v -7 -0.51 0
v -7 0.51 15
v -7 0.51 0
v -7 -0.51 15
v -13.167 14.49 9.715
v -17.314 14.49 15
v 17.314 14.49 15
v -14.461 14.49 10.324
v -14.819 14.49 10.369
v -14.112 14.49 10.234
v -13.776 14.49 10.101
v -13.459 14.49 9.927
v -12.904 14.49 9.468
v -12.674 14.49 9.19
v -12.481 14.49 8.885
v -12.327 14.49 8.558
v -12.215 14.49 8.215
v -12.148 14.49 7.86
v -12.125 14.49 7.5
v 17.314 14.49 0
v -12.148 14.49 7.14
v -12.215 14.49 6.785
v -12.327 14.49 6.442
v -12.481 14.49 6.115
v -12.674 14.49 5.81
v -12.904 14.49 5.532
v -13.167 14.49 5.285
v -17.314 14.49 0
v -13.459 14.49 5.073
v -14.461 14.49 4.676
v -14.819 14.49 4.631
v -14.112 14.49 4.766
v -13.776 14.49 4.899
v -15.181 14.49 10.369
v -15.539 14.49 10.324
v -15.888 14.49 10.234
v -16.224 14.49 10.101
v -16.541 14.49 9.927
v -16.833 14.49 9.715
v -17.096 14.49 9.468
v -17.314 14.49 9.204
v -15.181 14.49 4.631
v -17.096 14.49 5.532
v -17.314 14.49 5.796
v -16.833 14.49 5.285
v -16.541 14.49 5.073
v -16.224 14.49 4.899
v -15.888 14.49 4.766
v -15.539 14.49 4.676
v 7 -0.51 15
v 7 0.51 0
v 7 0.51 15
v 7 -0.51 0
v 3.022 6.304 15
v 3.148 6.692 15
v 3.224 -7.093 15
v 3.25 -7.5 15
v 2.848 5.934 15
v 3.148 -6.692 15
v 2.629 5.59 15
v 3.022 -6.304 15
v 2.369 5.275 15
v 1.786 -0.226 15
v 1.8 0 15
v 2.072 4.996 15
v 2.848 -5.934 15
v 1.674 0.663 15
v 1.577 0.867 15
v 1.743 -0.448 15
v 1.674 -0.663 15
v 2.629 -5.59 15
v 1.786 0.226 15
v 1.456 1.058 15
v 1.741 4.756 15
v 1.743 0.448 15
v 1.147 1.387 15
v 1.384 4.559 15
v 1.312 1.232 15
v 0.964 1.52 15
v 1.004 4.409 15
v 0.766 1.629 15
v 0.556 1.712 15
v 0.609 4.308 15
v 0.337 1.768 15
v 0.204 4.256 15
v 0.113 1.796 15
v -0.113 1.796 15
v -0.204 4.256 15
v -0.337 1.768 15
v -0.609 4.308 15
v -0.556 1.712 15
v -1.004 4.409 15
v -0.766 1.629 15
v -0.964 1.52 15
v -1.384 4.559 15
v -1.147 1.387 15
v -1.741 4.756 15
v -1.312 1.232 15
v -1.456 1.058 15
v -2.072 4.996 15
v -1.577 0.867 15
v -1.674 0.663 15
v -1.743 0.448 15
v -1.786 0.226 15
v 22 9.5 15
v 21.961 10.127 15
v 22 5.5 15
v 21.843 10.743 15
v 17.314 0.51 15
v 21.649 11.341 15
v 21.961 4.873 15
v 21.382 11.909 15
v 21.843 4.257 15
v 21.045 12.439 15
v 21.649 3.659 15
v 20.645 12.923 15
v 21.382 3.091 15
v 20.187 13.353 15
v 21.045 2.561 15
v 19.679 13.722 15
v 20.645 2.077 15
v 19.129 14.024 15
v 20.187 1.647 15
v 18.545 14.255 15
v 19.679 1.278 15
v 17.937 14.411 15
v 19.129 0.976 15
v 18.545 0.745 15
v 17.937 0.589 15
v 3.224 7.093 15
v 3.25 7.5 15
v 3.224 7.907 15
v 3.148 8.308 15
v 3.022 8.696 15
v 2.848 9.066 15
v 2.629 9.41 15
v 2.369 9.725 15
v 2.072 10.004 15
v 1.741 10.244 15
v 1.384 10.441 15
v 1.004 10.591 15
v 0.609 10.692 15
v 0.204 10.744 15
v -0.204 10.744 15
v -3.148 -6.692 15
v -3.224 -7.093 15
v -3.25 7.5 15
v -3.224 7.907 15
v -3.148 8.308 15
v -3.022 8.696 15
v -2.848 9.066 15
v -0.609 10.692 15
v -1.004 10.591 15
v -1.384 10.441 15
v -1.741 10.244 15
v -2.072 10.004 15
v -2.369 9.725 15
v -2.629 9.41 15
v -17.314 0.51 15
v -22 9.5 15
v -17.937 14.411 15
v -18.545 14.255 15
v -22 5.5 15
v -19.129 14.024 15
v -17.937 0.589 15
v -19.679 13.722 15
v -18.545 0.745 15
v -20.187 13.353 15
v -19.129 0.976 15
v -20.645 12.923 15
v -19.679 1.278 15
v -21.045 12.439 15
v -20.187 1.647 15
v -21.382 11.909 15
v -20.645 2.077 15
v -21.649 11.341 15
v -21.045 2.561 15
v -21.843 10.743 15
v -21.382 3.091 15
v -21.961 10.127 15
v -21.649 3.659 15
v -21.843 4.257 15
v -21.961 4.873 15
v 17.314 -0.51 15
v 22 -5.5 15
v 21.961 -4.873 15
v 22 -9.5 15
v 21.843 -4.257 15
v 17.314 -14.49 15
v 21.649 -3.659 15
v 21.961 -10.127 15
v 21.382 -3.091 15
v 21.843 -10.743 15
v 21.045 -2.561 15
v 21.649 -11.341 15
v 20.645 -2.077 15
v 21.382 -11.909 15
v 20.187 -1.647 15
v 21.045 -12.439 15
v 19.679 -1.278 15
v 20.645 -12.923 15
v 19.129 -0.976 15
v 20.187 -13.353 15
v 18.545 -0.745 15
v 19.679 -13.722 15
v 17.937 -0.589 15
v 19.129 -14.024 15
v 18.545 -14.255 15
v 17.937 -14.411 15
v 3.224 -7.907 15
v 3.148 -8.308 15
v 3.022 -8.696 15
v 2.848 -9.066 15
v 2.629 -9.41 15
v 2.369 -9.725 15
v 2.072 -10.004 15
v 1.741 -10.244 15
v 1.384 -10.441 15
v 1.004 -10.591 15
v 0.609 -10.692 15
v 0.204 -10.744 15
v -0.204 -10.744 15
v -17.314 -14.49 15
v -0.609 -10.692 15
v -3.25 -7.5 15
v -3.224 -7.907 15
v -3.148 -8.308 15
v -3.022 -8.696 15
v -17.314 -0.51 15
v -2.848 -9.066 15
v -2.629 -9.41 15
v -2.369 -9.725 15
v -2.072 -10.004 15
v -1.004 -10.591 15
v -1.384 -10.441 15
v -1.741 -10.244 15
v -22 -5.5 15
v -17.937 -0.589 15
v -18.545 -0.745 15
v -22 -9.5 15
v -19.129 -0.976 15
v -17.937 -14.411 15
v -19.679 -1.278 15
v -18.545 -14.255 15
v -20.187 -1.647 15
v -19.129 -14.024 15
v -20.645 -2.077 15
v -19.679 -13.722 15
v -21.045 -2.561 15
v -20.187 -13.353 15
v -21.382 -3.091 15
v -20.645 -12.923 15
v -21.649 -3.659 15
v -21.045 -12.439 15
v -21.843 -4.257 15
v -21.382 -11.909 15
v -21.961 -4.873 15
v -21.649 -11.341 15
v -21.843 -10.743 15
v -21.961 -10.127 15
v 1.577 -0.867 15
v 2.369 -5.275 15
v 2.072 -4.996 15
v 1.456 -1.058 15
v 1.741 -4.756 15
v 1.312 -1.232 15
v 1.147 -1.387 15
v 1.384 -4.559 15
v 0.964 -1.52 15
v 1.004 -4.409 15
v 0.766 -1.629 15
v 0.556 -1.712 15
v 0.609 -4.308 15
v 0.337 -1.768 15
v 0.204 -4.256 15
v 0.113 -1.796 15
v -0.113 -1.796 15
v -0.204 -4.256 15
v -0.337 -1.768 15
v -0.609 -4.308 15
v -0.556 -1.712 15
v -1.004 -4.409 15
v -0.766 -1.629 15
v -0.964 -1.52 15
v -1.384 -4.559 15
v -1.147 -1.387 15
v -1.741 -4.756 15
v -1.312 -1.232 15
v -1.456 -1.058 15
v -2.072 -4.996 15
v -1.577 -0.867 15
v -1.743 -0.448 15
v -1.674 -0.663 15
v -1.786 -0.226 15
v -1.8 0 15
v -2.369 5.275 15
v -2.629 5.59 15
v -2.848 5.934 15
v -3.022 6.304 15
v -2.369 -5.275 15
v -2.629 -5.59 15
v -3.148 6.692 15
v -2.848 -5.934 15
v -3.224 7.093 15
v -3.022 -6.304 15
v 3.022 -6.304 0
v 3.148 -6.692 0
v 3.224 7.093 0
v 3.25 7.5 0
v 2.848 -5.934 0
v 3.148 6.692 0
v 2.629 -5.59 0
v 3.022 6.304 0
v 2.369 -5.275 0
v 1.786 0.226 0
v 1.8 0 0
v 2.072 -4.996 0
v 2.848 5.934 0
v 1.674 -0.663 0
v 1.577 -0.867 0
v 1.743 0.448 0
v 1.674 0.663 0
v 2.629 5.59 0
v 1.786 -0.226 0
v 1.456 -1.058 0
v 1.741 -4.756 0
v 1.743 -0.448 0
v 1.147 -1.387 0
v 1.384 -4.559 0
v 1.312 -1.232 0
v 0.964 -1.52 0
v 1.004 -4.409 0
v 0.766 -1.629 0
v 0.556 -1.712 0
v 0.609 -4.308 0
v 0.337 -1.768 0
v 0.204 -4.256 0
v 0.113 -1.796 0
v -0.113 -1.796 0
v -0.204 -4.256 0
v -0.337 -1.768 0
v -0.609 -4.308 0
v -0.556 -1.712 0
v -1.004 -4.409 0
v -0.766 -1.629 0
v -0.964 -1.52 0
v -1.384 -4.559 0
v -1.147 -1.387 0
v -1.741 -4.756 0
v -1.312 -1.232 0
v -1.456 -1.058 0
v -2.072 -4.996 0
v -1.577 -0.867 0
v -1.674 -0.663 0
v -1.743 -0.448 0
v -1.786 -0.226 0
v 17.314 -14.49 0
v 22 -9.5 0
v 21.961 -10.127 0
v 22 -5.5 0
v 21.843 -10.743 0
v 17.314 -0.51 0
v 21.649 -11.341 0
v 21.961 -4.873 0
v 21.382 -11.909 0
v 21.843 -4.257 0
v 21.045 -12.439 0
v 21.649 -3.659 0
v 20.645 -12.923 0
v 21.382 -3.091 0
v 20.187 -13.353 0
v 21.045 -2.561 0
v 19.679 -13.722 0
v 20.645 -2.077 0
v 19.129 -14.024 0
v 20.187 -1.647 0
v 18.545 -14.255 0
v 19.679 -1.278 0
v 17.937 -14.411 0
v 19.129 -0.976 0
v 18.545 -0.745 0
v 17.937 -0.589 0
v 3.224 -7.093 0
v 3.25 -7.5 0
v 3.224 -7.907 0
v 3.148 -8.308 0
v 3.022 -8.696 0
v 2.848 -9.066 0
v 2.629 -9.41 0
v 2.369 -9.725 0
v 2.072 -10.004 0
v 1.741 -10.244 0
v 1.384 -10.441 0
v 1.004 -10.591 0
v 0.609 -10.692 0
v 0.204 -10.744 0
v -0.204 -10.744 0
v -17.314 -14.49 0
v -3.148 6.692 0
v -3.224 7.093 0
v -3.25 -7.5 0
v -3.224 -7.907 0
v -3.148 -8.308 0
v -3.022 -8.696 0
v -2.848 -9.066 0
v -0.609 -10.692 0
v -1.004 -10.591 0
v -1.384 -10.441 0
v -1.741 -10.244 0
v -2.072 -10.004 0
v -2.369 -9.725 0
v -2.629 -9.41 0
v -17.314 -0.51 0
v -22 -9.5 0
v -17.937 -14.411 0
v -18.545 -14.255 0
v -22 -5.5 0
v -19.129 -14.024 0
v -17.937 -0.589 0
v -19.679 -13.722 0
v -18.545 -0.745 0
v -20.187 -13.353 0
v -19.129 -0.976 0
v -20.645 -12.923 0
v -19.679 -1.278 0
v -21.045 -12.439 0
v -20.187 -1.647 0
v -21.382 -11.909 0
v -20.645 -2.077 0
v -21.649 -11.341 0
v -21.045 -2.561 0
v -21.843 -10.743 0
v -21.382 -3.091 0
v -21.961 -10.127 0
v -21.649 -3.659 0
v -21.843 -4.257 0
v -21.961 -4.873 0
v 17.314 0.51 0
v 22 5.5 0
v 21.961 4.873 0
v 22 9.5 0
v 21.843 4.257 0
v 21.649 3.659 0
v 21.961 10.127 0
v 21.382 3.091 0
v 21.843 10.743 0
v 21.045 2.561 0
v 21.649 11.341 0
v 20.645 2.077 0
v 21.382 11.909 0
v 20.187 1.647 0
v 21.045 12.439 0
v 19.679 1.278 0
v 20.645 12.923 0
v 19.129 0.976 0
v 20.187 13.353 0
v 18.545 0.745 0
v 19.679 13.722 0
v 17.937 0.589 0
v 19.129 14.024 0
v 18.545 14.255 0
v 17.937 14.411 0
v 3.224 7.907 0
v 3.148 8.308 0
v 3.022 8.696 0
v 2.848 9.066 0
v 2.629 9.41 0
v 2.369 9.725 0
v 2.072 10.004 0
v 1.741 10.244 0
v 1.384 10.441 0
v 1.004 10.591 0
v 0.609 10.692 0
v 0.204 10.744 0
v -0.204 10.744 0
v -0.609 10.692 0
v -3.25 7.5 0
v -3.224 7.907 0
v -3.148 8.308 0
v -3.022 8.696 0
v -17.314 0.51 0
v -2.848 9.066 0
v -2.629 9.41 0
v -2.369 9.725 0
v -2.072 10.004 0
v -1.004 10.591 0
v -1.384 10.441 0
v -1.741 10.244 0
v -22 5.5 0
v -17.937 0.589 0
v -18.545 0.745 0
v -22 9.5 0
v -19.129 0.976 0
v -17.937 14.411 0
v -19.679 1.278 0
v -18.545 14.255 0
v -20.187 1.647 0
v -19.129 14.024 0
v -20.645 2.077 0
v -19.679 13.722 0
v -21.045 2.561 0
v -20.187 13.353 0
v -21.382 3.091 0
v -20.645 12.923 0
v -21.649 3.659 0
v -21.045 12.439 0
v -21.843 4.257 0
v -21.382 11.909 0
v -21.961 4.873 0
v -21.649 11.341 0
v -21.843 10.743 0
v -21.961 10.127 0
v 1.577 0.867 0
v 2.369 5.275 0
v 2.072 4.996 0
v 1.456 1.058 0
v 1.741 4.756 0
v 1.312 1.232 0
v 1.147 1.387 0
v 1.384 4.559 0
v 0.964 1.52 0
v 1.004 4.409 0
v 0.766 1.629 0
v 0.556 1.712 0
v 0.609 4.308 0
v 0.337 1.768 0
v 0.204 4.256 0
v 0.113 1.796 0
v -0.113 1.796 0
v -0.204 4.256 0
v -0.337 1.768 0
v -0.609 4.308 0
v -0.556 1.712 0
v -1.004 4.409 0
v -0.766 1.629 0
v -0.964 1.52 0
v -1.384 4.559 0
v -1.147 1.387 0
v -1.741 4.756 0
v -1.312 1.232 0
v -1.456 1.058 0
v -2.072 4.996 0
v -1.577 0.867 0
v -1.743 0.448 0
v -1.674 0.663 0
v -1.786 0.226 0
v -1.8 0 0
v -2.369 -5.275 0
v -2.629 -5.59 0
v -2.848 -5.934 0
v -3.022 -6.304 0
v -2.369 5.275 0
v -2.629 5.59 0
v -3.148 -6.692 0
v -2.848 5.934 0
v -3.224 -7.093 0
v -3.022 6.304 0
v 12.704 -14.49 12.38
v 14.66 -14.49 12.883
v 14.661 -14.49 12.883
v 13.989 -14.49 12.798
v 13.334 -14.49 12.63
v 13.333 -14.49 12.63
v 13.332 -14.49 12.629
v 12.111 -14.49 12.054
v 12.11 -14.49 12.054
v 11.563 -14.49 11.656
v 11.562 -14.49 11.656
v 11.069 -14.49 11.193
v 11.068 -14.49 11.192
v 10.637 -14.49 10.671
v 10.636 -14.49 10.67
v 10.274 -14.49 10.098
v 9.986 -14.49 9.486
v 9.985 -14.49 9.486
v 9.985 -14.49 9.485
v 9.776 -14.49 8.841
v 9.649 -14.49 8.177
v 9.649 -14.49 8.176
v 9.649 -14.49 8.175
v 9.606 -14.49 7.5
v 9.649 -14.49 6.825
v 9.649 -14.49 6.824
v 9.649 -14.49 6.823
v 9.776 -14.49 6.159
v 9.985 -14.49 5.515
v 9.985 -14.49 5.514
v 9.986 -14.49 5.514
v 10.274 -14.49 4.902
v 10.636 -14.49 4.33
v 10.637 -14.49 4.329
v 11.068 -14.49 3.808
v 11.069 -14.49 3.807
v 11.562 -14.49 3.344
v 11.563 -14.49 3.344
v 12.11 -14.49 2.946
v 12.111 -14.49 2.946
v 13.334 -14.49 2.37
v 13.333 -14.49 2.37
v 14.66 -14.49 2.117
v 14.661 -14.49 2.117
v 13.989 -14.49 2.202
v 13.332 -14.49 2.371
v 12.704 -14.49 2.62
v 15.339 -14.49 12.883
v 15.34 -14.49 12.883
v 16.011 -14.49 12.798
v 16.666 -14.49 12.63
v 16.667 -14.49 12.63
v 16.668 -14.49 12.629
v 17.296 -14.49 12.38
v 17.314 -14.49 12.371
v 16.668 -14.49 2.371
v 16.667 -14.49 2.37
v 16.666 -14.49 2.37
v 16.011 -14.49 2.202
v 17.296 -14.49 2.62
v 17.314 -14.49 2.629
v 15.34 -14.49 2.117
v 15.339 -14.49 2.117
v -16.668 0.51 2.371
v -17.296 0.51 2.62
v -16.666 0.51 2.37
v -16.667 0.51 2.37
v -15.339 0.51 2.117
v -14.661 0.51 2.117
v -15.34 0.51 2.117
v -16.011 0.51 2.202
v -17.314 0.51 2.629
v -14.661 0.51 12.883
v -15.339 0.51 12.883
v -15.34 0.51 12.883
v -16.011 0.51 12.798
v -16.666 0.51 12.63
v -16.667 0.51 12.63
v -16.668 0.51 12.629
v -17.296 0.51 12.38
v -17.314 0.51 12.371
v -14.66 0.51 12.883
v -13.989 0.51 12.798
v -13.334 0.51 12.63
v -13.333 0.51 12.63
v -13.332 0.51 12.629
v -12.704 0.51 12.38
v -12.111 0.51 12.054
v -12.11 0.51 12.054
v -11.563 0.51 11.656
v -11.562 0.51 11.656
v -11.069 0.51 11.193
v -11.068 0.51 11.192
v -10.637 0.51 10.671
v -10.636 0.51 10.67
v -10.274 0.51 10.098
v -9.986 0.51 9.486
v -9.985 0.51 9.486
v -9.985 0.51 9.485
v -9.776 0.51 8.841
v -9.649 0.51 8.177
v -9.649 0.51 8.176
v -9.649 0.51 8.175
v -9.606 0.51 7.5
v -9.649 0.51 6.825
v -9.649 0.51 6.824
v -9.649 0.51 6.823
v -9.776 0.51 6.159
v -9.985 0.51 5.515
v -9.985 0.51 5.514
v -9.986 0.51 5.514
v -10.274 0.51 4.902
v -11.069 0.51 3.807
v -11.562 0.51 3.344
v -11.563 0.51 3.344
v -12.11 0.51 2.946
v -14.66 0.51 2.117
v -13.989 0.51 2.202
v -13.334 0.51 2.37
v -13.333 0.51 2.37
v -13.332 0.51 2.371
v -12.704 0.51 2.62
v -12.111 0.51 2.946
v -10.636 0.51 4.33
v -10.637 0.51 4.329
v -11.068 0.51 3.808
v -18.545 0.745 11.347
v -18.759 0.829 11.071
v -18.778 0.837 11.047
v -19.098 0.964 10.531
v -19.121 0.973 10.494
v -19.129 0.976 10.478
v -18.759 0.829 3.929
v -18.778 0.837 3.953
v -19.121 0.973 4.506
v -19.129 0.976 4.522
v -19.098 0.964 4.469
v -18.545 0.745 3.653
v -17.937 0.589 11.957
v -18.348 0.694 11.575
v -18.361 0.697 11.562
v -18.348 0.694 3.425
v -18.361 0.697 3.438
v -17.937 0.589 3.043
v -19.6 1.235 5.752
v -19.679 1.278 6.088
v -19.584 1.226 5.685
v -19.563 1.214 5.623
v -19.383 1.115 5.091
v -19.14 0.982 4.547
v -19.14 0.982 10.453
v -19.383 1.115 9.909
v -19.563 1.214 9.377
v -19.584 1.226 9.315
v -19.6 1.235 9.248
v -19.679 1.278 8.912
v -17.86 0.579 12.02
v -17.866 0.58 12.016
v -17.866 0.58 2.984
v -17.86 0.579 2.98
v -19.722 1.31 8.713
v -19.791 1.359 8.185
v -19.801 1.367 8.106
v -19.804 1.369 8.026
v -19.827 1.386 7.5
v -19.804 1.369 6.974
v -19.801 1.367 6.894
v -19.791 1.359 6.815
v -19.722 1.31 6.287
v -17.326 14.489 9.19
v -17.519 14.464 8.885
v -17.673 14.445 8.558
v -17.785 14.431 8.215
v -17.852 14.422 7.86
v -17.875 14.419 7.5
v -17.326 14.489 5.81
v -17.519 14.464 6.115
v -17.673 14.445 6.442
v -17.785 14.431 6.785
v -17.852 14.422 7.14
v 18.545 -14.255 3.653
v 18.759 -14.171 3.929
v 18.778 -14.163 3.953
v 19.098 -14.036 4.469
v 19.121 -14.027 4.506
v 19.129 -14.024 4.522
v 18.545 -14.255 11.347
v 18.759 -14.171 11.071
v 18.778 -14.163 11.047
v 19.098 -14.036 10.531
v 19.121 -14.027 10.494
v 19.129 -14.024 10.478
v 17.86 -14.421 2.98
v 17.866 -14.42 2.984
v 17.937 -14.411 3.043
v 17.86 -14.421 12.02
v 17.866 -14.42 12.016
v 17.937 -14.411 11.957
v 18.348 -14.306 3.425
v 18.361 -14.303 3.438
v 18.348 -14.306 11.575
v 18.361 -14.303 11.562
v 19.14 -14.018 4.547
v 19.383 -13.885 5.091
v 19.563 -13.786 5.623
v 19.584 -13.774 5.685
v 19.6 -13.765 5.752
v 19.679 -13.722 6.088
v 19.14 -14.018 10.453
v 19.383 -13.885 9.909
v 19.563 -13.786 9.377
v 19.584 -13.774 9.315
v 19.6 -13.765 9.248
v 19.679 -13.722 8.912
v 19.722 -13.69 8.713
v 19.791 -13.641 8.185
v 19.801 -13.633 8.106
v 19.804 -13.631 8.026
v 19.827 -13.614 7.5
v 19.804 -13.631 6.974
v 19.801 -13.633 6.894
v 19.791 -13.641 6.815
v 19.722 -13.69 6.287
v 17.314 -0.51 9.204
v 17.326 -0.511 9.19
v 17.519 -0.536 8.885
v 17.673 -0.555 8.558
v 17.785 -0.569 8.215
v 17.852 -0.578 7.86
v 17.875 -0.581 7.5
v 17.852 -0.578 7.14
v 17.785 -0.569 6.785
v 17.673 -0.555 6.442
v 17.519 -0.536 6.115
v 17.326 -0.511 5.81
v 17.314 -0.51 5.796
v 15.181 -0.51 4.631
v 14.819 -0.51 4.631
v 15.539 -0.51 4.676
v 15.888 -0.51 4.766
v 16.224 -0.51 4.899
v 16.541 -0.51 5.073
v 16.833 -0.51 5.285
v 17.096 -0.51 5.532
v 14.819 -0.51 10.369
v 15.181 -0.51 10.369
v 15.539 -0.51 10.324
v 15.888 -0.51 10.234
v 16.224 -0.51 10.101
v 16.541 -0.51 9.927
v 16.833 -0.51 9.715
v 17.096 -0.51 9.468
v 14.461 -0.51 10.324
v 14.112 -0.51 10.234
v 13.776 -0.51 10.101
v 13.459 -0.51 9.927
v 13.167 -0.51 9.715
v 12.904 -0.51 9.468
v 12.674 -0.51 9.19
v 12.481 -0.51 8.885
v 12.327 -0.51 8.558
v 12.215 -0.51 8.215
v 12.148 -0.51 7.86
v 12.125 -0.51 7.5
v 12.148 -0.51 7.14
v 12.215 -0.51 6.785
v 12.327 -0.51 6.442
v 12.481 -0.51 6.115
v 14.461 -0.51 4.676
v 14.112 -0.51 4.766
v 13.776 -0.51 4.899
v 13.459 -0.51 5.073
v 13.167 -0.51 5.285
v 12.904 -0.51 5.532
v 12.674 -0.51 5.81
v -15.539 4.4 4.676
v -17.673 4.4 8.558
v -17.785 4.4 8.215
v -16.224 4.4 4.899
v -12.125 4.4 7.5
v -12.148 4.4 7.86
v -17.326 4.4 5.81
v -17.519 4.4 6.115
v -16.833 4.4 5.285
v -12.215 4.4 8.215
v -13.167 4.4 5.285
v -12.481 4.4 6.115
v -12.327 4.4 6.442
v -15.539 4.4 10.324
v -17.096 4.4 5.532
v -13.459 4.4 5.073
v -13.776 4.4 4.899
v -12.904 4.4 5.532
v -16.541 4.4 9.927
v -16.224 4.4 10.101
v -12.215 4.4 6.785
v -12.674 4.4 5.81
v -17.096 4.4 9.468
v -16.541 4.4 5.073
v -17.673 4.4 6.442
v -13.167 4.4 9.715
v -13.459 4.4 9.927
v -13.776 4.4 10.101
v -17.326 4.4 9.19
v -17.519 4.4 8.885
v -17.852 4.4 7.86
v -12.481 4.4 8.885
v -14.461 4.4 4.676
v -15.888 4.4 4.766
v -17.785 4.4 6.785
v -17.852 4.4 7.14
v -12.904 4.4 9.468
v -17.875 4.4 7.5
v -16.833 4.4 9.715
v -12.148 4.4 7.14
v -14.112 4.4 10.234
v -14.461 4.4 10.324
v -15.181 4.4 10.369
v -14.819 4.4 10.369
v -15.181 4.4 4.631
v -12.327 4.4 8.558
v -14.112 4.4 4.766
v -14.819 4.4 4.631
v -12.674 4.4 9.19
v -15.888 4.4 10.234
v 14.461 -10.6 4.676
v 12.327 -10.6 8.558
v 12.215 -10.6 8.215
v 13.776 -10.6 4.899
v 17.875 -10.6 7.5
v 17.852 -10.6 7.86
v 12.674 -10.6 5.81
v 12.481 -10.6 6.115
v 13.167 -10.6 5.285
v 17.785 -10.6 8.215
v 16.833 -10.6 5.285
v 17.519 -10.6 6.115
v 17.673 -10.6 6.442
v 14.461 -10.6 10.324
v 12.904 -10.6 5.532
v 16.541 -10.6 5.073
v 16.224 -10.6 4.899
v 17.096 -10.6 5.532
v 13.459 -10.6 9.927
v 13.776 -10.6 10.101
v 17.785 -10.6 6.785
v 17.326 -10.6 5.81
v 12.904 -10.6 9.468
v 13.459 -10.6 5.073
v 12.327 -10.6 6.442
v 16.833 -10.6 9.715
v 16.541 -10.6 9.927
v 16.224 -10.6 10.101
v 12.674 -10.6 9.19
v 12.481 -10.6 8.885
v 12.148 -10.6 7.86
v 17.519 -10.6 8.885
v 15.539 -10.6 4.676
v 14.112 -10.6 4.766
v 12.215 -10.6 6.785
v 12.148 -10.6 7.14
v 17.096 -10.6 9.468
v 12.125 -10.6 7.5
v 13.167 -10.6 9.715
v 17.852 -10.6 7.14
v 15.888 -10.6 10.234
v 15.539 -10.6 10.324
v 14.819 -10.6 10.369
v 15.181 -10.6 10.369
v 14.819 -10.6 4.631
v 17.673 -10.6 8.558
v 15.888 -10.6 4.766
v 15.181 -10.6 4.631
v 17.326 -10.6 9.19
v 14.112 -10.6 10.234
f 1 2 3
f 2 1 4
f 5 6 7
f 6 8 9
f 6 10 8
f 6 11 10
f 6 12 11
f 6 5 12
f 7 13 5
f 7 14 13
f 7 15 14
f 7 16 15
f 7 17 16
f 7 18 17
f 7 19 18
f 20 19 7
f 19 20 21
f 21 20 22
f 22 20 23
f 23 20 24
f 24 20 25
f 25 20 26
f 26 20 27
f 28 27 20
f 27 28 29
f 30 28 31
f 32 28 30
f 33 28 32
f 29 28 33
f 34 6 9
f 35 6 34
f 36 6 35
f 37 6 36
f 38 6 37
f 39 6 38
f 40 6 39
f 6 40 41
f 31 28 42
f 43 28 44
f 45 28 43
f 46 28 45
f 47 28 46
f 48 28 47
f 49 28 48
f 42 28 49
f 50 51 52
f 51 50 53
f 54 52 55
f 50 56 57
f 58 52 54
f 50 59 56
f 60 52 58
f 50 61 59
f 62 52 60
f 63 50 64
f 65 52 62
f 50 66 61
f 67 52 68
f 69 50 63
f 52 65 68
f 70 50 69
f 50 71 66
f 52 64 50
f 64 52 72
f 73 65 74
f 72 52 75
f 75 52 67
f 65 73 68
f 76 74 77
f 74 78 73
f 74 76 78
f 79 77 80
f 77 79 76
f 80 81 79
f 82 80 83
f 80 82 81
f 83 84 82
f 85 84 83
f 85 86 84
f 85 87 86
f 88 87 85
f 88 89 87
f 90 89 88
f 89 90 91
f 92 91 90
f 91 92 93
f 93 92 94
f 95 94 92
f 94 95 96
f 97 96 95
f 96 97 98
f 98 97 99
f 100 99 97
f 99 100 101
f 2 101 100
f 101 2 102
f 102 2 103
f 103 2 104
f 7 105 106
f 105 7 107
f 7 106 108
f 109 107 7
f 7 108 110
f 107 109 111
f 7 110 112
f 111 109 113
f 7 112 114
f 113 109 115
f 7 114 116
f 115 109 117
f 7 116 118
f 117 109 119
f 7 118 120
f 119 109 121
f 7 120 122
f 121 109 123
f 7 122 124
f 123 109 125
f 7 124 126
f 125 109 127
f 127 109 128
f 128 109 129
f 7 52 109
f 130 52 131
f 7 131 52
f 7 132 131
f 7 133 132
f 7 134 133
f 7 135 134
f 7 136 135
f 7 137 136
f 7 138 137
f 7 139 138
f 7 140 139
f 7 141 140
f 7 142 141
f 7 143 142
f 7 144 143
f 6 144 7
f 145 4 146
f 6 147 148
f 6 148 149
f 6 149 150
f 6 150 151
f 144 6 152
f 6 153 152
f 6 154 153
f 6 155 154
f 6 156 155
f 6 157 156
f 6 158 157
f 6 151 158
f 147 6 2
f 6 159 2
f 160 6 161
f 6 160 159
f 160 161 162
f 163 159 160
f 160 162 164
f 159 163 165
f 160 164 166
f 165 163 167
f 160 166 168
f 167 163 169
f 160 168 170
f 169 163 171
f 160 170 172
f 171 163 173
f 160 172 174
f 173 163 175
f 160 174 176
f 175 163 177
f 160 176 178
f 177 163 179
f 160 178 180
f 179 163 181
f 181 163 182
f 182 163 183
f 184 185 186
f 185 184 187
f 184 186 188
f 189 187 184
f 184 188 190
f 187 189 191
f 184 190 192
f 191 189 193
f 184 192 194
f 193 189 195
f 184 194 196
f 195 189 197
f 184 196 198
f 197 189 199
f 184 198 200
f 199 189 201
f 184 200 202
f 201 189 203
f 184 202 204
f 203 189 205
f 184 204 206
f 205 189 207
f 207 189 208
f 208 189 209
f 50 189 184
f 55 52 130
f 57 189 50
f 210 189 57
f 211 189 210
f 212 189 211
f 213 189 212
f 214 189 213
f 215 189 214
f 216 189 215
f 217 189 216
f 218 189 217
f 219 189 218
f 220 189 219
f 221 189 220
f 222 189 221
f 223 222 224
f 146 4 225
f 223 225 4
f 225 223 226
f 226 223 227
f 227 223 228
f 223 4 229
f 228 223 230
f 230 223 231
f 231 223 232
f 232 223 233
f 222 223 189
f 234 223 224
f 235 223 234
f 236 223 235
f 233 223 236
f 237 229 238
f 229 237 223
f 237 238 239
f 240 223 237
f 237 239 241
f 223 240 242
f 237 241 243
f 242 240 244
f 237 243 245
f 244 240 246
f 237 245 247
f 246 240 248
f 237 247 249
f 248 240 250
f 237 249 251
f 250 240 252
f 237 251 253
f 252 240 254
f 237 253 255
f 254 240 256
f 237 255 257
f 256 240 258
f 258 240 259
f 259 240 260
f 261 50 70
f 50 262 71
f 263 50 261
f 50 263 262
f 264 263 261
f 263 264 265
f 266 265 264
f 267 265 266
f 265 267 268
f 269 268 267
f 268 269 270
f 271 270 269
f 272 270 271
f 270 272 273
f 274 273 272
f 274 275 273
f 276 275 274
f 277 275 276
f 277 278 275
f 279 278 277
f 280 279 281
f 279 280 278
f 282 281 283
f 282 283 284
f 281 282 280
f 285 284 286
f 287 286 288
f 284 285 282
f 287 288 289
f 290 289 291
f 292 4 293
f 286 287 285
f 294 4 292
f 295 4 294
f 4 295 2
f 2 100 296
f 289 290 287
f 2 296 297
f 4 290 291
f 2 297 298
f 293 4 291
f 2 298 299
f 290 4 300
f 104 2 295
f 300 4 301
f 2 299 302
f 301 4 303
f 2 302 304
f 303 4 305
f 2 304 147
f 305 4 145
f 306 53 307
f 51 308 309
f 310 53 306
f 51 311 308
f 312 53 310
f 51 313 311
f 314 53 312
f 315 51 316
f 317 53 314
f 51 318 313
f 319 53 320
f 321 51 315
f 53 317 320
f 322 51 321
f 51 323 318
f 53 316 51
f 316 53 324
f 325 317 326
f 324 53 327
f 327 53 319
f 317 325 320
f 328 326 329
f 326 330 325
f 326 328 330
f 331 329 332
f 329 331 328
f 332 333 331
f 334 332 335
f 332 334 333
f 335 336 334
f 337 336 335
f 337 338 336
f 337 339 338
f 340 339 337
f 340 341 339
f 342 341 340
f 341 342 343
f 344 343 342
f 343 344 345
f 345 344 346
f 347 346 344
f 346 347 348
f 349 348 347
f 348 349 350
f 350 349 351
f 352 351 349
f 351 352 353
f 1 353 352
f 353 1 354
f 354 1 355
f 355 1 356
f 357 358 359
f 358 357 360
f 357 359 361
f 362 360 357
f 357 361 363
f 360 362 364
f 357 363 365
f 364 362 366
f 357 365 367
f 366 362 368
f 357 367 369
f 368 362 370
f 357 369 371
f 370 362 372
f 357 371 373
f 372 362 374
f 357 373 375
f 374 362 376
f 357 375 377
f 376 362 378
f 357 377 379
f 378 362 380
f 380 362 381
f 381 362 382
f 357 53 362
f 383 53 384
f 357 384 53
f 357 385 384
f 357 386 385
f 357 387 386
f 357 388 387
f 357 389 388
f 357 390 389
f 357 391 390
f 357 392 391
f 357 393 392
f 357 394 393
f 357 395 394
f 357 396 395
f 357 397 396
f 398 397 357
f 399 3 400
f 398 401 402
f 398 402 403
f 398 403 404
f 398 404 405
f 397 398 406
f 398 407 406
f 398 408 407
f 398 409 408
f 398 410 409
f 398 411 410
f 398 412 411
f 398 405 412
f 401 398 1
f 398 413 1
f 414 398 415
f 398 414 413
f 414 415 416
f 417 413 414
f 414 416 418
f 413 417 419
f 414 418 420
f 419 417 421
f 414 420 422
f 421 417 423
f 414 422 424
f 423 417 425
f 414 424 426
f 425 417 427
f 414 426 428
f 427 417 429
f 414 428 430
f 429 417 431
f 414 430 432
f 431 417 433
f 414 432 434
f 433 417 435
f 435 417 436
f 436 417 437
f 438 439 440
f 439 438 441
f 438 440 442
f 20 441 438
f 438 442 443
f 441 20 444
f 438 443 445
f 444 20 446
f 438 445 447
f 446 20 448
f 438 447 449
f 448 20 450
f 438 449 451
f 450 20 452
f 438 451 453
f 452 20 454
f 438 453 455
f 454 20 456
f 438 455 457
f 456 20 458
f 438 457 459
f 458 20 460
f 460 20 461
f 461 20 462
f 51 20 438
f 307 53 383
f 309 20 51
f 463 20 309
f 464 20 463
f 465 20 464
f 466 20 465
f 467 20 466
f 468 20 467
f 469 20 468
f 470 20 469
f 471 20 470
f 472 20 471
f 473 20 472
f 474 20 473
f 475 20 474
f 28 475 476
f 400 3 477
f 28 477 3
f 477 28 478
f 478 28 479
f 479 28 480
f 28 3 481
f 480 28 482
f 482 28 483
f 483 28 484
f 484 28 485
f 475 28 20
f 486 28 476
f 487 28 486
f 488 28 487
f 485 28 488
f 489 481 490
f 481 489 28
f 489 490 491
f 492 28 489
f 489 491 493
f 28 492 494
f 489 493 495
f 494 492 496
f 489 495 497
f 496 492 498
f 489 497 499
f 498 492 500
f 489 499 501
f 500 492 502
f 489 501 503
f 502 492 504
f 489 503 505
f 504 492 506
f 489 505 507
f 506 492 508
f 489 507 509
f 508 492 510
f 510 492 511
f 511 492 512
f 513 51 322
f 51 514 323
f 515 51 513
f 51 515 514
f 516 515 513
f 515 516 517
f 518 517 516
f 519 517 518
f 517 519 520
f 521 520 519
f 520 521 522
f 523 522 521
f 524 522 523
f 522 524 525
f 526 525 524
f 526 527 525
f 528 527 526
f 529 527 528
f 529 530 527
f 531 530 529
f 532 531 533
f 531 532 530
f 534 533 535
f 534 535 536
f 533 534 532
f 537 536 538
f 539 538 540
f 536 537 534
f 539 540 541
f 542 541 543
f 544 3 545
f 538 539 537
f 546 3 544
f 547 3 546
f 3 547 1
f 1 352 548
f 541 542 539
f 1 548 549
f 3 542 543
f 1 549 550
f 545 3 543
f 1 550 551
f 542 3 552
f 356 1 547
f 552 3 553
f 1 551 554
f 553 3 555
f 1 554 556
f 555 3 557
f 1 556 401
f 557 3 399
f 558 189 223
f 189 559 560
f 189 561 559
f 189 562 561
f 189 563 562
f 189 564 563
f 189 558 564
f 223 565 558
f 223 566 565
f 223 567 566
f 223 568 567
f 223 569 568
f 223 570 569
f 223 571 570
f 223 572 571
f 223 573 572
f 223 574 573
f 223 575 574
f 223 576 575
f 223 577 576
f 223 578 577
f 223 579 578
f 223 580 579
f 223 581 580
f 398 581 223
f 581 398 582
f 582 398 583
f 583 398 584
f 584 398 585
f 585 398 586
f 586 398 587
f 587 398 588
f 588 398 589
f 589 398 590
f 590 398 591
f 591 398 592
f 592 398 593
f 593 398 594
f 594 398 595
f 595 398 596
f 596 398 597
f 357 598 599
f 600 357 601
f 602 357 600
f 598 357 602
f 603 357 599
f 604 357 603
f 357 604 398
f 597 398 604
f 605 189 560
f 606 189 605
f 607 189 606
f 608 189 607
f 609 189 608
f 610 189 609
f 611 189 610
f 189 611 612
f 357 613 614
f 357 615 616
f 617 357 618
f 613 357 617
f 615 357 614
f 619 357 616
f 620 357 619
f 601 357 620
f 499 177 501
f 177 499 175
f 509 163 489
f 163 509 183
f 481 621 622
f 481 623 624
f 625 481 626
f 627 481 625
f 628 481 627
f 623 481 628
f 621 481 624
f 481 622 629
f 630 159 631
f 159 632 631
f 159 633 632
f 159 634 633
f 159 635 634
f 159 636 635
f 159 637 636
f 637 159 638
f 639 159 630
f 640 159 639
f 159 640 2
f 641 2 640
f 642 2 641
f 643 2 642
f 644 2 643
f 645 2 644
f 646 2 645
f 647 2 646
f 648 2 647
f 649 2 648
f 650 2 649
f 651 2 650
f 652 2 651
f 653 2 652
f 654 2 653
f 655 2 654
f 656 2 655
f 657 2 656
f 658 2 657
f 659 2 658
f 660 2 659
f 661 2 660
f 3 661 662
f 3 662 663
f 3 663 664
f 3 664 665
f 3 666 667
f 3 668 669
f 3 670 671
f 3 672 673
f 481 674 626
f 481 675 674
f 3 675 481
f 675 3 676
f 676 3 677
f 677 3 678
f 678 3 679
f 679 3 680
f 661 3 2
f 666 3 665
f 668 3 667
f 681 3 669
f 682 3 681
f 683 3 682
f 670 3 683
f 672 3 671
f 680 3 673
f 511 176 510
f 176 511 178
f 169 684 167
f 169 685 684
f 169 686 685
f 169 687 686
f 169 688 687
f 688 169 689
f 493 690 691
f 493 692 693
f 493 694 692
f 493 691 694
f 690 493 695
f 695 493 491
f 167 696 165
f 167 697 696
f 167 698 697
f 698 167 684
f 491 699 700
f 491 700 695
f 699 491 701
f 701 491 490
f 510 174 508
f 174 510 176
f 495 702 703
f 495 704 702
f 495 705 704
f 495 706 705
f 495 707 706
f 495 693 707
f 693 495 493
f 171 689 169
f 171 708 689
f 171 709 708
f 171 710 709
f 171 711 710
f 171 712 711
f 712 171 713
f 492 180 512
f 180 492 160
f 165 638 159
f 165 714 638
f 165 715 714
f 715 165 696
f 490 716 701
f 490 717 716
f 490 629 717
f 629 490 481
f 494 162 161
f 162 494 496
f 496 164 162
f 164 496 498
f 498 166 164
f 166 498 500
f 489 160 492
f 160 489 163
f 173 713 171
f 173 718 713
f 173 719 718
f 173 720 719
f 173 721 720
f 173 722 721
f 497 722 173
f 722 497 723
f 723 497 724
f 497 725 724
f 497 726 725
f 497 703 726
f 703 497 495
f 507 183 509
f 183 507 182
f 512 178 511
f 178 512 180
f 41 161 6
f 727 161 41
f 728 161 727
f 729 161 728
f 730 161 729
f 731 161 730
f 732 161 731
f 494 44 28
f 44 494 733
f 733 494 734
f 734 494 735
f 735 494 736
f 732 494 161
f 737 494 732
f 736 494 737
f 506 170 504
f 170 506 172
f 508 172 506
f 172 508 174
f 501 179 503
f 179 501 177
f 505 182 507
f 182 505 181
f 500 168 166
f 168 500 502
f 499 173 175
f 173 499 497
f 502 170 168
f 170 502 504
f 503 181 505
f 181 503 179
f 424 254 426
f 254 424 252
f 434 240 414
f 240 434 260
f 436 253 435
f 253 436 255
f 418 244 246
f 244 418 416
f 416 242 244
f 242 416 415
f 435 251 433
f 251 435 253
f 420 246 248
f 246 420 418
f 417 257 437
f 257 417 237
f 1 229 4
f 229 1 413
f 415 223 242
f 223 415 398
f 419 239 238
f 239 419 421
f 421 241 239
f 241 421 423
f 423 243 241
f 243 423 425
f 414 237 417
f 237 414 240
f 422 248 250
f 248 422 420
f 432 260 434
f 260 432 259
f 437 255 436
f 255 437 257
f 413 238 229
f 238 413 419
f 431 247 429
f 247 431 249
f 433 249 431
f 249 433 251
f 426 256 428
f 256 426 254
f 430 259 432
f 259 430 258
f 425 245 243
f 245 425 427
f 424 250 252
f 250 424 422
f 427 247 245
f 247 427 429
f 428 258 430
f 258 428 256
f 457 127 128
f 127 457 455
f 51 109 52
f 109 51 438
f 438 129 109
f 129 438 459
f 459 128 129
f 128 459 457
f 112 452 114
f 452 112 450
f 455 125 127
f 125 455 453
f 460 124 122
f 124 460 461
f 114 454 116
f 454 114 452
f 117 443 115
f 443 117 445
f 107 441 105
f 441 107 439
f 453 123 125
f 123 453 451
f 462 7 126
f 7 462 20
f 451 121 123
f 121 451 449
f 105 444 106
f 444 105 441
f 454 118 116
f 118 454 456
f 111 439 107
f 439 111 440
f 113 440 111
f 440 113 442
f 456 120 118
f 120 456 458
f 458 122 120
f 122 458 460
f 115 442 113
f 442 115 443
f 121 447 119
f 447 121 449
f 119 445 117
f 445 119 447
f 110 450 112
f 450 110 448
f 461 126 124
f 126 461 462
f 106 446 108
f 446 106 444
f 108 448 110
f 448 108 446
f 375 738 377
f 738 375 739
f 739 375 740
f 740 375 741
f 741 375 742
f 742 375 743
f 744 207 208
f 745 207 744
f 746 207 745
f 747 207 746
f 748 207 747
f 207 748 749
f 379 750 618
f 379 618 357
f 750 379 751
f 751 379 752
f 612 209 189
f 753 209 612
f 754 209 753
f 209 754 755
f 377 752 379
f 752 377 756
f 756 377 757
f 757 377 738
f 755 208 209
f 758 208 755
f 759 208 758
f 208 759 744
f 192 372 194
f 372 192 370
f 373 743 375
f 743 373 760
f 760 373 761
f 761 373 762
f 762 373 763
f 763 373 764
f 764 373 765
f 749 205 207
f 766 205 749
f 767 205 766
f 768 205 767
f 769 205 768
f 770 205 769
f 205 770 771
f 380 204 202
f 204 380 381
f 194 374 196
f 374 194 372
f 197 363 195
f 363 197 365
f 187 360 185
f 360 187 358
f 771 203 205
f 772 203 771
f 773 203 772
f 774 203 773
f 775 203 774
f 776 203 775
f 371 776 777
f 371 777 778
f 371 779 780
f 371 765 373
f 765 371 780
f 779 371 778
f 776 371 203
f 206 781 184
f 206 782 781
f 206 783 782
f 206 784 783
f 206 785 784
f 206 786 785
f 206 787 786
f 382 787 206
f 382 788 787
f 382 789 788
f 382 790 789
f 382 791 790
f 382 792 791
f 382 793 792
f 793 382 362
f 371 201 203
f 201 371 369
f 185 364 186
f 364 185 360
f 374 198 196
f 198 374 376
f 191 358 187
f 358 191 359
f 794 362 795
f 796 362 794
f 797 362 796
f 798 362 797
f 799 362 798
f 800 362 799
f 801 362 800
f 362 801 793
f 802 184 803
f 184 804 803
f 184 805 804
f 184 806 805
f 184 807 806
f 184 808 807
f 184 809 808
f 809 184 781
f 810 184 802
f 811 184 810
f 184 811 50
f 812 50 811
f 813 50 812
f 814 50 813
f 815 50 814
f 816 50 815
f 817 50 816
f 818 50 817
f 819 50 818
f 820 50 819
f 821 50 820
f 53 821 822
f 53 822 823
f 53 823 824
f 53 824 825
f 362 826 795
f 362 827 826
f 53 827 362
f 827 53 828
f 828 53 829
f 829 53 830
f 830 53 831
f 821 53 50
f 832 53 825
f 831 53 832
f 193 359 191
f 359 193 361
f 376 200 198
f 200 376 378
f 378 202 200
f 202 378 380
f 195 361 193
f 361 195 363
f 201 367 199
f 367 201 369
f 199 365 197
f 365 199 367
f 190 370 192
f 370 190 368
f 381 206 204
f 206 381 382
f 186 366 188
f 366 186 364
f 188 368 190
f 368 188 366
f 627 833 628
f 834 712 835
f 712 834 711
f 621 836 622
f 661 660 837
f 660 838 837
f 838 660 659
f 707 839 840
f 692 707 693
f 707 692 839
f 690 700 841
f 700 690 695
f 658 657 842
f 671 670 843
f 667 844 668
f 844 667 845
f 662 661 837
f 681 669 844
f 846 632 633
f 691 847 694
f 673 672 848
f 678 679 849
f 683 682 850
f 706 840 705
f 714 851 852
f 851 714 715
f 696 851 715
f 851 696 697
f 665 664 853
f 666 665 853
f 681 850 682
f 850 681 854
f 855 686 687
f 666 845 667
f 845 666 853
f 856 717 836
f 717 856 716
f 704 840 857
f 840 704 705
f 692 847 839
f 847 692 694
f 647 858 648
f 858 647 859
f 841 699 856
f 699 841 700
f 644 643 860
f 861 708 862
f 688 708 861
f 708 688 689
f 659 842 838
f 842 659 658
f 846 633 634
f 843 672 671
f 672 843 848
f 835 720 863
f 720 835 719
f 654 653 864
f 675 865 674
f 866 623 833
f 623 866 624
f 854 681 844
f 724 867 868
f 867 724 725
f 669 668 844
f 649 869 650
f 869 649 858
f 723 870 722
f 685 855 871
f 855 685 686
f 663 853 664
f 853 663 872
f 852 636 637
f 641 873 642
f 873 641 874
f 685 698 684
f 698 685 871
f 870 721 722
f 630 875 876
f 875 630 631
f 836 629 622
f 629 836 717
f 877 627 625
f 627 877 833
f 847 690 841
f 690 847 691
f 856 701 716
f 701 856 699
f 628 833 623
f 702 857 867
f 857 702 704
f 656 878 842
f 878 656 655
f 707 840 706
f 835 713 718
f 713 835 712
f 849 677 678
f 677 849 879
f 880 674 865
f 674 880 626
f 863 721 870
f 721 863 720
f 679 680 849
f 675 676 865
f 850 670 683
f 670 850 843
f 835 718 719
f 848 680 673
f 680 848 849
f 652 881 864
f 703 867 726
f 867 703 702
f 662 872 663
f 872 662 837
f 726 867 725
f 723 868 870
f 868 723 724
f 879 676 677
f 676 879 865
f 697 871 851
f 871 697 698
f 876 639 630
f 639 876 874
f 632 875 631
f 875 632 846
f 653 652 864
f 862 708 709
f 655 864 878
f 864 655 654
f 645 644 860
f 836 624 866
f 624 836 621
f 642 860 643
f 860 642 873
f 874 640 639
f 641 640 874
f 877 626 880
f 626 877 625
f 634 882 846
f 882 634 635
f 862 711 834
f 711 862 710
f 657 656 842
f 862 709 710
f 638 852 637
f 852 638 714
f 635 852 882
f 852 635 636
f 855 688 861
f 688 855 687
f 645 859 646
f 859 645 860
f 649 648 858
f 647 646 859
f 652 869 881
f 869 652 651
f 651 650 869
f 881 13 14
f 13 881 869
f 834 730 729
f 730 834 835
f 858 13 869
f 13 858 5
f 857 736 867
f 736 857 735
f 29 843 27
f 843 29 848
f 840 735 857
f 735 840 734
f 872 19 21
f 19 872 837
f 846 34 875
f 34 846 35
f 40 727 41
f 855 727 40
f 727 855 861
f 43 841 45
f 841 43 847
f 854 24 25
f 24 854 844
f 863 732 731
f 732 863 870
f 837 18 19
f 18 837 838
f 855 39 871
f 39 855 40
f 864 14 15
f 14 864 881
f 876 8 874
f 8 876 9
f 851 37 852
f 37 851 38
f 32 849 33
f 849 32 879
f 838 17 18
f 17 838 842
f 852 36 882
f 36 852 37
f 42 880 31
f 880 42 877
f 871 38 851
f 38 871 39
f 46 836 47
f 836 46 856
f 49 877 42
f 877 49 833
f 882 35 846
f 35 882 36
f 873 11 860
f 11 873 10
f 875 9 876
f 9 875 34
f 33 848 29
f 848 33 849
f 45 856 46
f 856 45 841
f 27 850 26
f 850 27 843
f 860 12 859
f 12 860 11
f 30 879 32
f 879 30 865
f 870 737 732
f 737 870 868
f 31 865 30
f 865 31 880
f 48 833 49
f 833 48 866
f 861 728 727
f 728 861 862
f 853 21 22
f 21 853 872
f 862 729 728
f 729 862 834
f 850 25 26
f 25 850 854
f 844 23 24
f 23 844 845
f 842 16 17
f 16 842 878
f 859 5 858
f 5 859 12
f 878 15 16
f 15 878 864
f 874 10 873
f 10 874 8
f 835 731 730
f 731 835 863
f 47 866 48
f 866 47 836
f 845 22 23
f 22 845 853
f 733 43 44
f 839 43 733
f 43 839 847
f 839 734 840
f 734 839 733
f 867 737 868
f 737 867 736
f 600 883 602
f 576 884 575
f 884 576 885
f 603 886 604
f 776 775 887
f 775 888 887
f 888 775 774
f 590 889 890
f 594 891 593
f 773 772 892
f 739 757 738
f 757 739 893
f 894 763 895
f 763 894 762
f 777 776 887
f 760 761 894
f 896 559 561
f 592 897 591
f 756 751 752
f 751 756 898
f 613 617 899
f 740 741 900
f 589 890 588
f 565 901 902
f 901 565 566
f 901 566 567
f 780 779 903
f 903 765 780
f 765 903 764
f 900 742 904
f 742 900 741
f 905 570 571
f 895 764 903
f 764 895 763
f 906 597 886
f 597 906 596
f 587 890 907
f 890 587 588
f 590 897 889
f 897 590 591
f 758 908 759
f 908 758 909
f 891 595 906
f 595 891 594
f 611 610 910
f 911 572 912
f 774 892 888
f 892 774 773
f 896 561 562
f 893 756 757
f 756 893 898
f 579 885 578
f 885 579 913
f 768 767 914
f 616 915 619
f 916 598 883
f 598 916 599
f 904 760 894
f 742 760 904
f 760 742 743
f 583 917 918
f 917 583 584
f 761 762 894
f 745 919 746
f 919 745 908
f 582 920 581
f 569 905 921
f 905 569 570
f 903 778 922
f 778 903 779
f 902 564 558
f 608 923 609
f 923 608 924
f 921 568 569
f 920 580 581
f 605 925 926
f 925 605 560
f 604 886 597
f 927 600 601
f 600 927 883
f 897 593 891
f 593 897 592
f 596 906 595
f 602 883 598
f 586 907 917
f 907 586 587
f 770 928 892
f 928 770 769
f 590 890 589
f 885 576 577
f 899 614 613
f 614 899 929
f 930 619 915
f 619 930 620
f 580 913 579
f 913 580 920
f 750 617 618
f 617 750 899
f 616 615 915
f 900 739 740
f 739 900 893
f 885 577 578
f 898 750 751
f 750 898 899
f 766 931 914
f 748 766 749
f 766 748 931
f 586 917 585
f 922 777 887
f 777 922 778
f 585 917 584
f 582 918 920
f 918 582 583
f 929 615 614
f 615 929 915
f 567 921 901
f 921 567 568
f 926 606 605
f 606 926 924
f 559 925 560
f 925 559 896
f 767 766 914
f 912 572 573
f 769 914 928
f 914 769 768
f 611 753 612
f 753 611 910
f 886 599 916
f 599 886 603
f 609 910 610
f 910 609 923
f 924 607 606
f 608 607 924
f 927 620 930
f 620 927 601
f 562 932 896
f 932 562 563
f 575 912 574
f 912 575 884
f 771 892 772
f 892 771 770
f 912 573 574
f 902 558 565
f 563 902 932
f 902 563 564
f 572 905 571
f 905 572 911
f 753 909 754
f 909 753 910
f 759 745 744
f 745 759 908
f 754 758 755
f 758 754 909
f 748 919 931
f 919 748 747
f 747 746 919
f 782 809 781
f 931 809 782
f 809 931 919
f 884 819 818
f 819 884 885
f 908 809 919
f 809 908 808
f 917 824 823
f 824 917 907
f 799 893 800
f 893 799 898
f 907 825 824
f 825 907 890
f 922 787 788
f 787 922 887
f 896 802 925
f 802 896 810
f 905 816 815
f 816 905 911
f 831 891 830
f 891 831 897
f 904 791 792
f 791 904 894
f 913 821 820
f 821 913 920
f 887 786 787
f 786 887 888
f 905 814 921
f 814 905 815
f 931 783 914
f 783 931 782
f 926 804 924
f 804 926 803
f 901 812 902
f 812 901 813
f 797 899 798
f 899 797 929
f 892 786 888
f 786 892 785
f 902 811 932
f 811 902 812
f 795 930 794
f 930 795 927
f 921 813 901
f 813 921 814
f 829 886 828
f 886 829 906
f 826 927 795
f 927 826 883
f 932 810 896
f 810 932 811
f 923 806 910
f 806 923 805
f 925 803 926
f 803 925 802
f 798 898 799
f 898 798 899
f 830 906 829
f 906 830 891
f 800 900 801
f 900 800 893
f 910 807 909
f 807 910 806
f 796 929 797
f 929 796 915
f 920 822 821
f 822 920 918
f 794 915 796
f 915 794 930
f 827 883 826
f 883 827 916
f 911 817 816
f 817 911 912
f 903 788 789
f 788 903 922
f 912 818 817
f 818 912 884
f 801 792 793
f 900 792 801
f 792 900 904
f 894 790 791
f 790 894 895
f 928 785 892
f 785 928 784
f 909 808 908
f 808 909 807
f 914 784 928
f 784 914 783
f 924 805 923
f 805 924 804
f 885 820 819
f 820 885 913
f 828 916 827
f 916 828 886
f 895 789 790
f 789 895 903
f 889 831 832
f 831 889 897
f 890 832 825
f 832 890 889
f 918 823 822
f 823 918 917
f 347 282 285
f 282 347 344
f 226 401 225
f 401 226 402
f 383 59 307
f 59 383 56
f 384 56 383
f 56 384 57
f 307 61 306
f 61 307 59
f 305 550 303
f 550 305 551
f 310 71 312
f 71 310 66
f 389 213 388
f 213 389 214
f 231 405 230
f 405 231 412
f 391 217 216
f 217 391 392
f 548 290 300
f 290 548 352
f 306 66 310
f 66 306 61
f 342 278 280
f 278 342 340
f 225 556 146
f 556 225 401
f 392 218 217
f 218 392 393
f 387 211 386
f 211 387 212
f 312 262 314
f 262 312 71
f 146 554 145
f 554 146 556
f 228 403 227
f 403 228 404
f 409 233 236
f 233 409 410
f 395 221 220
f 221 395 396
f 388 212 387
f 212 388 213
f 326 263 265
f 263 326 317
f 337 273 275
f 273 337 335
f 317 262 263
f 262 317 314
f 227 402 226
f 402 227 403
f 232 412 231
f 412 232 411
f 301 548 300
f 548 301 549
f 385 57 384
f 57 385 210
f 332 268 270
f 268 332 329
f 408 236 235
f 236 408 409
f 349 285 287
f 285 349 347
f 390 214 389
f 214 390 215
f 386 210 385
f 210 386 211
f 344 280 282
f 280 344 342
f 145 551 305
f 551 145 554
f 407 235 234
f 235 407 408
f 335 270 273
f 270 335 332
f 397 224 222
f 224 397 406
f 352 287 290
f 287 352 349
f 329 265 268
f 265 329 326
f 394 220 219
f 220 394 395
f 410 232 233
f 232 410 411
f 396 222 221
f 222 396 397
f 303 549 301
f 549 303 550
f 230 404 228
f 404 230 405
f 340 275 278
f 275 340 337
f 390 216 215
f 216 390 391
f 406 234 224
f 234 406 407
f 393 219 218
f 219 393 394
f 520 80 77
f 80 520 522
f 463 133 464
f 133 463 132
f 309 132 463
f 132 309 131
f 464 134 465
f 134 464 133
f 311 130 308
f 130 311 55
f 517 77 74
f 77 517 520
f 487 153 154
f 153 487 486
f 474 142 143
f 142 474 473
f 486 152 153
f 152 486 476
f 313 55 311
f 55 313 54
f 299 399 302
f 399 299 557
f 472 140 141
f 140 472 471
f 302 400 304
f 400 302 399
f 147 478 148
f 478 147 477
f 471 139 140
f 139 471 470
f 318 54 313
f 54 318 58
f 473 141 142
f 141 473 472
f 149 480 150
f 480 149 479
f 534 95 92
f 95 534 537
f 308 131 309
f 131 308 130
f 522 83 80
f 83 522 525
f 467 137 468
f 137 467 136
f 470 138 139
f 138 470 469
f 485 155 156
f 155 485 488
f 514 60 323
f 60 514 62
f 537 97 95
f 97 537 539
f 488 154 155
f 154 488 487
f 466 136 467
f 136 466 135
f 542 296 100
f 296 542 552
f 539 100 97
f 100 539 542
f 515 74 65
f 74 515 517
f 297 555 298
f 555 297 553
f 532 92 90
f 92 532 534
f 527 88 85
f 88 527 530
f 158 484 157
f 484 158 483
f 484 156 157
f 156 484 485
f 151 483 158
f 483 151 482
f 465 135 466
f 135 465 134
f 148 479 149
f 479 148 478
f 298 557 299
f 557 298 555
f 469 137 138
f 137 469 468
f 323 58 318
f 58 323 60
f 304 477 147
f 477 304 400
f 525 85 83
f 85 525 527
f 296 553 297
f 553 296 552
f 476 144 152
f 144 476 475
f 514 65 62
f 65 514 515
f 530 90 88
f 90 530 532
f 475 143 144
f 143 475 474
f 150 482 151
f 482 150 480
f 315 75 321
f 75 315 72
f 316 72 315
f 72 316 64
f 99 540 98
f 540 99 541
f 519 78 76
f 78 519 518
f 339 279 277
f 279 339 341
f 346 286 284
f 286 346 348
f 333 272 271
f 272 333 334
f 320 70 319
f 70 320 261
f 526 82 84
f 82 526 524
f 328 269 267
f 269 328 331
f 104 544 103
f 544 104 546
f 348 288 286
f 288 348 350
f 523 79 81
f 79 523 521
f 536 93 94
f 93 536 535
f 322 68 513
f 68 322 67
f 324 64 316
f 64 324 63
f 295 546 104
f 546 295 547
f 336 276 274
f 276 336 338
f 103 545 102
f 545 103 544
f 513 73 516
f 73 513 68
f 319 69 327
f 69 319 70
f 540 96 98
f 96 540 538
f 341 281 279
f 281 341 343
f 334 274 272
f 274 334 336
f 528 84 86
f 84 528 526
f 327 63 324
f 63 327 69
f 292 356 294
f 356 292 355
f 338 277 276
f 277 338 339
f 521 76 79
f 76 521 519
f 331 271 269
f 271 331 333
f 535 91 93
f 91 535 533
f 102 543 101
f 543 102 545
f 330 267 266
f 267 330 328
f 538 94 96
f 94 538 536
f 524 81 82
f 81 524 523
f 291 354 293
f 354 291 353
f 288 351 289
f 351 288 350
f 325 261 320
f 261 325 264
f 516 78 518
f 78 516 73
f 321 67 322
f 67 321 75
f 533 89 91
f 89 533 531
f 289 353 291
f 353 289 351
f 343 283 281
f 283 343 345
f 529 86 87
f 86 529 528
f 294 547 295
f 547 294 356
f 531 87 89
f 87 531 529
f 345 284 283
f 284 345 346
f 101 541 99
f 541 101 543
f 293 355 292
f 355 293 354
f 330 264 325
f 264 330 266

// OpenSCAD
$fn = 50;


difference() {
	union() {
		hull() {
			translate(v = [-2.0000000000, 9.5000000000, 0]) {
				cylinder(h = 15, r = 5);
			}
			translate(v = [2.0000000000, 9.5000000000, 0]) {
				cylinder(h = 15, r = 5);
			}
			translate(v = [-2.0000000000, -9.5000000000, 0]) {
				cylinder(h = 15, r = 5);
			}
			translate(v = [2.0000000000, -9.5000000000, 0]) {
				cylinder(h = 15, r = 5);
			}
		}
		translate(v = [-7.5000000000, 7.5000000000, 0]) {
			hull() {
				translate(v = [-9.5000000000, 2.0000000000, 0]) {
					cylinder(h = 15, r = 5);
				}
				translate(v = [9.5000000000, 2.0000000000, 0]) {
					cylinder(h = 15, r = 5);
				}
				translate(v = [-9.5000000000, -2.0000000000, 0]) {
					cylinder(h = 15, r = 5);
				}
				translate(v = [9.5000000000, -2.0000000000, 0]) {
					cylinder(h = 15, r = 5);
				}
			}
		}
		translate(v = [-7.5000000000, -7.5000000000, 0]) {
			hull() {
				translate(v = [-9.5000000000, 2.0000000000, 0]) {
					cylinder(h = 15, r = 5);
				}
				translate(v = [9.5000000000, 2.0000000000, 0]) {
					cylinder(h = 15, r = 5);
				}
				translate(v = [-9.5000000000, -2.0000000000, 0]) {
					cylinder(h = 15, r = 5);
				}
				translate(v = [9.5000000000, -2.0000000000, 0]) {
					cylinder(h = 15, r = 5);
				}
			}
		}
		translate(v = [7.5000000000, 7.5000000000, 0]) {
			hull() {
				translate(v = [-9.5000000000, 2.0000000000, 0]) {
					cylinder(h = 15, r = 5);
				}
				translate(v = [9.5000000000, 2.0000000000, 0]) {
					cylinder(h = 15, r = 5);
				}
				translate(v = [-9.5000000000, -2.0000000000, 0]) {
					cylinder(h = 15, r = 5);
				}
				translate(v = [9.5000000000, -2.0000000000, 0]) {
					cylinder(h = 15, r = 5);
				}
			}
		}
		translate(v = [7.5000000000, -7.5000000000, 0]) {
			hull() {
				translate(v = [-9.5000000000, 2.0000000000, 0]) {
					cylinder(h = 15, r = 5);
				}
				translate(v = [9.5000000000, 2.0000000000, 0]) {
					cylinder(h = 15, r = 5);
				}
				translate(v = [-9.5000000000, -2.0000000000, 0]) {
					cylinder(h = 15, r = 5);
				}
				translate(v = [9.5000000000, -2.0000000000, 0]) {
					cylinder(h = 15, r = 5);
				}
			}
		}
	}
	union() {
		translate(v = [-15.0000000000, 0.5000000000, 7.5000000000]) {
			rotate(a = [90, 0, 0]) {
				difference() {
					union() {
						#translate(v = [0, 0, -14.0000000000]) {
							cylinder(h = 14, r = 2.6000000000);
						}
						#translate(v = [0, 0, -3.9000000000]) {
							cylinder(h = 3.9000000000, r1 = 2.8750000000, r2 = 5.4000000000);
						}
						#translate(v = [0, 0, -14.0000000000]) {
							cylinder(h = 14, r = 2.8750000000);
						}
						#translate(v = [0, 0, -14.0000000000]) {
							cylinder(h = 14, r = 2.6000000000);
						}
					}
					union();
				}
			}
		}
		translate(v = [15.0000000000, -14.5000000000, 7.5000000000]) {
			rotate(a = [90, 0, 0]) {
				difference() {
					union() {
						#translate(v = [0, 0, -14.0000000000]) {
							cylinder(h = 14, r = 2.6000000000);
						}
						#translate(v = [0, 0, -3.9000000000]) {
							cylinder(h = 3.9000000000, r1 = 2.8750000000, r2 = 5.4000000000);
						}
						#translate(v = [0, 0, -14.0000000000]) {
							cylinder(h = 14, r = 2.8750000000);
						}
						#translate(v = [0, 0, -14.0000000000]) {
							cylinder(h = 14, r = 2.6000000000);
						}
					}
					union();
				}
			}
		}
		translate(v = [0.0000000000, -7.5000000000, 0]) {
			translate(v = [0, 0, -100]) {
				cylinder(h = 200, r = 3.2500000000);
			}
		}
		translate(v = [0.0000000000, 7.5000000000, 0]) {
			translate(v = [0, 0, -100]) {
				cylinder(h = 200, r = 3.2500000000);
			}
		}
		translate(v = [0.0000000000, -7.5000000000, 0]) {
			translate(v = [0, 0, -100]) {
				cylinder(h = 200, r = 1.8000000000);
			}
		}
		translate(v = [0, 0, -100]) {
			cylinder(h = 200, r = 1.8000000000);
		}
		translate(v = [0.0000000000, 7.5000000000, 0]) {
			translate(v = [0, 0, -100]) {
				cylinder(h = 200, r = 1.8000000000);
			}
		}
	}
}
